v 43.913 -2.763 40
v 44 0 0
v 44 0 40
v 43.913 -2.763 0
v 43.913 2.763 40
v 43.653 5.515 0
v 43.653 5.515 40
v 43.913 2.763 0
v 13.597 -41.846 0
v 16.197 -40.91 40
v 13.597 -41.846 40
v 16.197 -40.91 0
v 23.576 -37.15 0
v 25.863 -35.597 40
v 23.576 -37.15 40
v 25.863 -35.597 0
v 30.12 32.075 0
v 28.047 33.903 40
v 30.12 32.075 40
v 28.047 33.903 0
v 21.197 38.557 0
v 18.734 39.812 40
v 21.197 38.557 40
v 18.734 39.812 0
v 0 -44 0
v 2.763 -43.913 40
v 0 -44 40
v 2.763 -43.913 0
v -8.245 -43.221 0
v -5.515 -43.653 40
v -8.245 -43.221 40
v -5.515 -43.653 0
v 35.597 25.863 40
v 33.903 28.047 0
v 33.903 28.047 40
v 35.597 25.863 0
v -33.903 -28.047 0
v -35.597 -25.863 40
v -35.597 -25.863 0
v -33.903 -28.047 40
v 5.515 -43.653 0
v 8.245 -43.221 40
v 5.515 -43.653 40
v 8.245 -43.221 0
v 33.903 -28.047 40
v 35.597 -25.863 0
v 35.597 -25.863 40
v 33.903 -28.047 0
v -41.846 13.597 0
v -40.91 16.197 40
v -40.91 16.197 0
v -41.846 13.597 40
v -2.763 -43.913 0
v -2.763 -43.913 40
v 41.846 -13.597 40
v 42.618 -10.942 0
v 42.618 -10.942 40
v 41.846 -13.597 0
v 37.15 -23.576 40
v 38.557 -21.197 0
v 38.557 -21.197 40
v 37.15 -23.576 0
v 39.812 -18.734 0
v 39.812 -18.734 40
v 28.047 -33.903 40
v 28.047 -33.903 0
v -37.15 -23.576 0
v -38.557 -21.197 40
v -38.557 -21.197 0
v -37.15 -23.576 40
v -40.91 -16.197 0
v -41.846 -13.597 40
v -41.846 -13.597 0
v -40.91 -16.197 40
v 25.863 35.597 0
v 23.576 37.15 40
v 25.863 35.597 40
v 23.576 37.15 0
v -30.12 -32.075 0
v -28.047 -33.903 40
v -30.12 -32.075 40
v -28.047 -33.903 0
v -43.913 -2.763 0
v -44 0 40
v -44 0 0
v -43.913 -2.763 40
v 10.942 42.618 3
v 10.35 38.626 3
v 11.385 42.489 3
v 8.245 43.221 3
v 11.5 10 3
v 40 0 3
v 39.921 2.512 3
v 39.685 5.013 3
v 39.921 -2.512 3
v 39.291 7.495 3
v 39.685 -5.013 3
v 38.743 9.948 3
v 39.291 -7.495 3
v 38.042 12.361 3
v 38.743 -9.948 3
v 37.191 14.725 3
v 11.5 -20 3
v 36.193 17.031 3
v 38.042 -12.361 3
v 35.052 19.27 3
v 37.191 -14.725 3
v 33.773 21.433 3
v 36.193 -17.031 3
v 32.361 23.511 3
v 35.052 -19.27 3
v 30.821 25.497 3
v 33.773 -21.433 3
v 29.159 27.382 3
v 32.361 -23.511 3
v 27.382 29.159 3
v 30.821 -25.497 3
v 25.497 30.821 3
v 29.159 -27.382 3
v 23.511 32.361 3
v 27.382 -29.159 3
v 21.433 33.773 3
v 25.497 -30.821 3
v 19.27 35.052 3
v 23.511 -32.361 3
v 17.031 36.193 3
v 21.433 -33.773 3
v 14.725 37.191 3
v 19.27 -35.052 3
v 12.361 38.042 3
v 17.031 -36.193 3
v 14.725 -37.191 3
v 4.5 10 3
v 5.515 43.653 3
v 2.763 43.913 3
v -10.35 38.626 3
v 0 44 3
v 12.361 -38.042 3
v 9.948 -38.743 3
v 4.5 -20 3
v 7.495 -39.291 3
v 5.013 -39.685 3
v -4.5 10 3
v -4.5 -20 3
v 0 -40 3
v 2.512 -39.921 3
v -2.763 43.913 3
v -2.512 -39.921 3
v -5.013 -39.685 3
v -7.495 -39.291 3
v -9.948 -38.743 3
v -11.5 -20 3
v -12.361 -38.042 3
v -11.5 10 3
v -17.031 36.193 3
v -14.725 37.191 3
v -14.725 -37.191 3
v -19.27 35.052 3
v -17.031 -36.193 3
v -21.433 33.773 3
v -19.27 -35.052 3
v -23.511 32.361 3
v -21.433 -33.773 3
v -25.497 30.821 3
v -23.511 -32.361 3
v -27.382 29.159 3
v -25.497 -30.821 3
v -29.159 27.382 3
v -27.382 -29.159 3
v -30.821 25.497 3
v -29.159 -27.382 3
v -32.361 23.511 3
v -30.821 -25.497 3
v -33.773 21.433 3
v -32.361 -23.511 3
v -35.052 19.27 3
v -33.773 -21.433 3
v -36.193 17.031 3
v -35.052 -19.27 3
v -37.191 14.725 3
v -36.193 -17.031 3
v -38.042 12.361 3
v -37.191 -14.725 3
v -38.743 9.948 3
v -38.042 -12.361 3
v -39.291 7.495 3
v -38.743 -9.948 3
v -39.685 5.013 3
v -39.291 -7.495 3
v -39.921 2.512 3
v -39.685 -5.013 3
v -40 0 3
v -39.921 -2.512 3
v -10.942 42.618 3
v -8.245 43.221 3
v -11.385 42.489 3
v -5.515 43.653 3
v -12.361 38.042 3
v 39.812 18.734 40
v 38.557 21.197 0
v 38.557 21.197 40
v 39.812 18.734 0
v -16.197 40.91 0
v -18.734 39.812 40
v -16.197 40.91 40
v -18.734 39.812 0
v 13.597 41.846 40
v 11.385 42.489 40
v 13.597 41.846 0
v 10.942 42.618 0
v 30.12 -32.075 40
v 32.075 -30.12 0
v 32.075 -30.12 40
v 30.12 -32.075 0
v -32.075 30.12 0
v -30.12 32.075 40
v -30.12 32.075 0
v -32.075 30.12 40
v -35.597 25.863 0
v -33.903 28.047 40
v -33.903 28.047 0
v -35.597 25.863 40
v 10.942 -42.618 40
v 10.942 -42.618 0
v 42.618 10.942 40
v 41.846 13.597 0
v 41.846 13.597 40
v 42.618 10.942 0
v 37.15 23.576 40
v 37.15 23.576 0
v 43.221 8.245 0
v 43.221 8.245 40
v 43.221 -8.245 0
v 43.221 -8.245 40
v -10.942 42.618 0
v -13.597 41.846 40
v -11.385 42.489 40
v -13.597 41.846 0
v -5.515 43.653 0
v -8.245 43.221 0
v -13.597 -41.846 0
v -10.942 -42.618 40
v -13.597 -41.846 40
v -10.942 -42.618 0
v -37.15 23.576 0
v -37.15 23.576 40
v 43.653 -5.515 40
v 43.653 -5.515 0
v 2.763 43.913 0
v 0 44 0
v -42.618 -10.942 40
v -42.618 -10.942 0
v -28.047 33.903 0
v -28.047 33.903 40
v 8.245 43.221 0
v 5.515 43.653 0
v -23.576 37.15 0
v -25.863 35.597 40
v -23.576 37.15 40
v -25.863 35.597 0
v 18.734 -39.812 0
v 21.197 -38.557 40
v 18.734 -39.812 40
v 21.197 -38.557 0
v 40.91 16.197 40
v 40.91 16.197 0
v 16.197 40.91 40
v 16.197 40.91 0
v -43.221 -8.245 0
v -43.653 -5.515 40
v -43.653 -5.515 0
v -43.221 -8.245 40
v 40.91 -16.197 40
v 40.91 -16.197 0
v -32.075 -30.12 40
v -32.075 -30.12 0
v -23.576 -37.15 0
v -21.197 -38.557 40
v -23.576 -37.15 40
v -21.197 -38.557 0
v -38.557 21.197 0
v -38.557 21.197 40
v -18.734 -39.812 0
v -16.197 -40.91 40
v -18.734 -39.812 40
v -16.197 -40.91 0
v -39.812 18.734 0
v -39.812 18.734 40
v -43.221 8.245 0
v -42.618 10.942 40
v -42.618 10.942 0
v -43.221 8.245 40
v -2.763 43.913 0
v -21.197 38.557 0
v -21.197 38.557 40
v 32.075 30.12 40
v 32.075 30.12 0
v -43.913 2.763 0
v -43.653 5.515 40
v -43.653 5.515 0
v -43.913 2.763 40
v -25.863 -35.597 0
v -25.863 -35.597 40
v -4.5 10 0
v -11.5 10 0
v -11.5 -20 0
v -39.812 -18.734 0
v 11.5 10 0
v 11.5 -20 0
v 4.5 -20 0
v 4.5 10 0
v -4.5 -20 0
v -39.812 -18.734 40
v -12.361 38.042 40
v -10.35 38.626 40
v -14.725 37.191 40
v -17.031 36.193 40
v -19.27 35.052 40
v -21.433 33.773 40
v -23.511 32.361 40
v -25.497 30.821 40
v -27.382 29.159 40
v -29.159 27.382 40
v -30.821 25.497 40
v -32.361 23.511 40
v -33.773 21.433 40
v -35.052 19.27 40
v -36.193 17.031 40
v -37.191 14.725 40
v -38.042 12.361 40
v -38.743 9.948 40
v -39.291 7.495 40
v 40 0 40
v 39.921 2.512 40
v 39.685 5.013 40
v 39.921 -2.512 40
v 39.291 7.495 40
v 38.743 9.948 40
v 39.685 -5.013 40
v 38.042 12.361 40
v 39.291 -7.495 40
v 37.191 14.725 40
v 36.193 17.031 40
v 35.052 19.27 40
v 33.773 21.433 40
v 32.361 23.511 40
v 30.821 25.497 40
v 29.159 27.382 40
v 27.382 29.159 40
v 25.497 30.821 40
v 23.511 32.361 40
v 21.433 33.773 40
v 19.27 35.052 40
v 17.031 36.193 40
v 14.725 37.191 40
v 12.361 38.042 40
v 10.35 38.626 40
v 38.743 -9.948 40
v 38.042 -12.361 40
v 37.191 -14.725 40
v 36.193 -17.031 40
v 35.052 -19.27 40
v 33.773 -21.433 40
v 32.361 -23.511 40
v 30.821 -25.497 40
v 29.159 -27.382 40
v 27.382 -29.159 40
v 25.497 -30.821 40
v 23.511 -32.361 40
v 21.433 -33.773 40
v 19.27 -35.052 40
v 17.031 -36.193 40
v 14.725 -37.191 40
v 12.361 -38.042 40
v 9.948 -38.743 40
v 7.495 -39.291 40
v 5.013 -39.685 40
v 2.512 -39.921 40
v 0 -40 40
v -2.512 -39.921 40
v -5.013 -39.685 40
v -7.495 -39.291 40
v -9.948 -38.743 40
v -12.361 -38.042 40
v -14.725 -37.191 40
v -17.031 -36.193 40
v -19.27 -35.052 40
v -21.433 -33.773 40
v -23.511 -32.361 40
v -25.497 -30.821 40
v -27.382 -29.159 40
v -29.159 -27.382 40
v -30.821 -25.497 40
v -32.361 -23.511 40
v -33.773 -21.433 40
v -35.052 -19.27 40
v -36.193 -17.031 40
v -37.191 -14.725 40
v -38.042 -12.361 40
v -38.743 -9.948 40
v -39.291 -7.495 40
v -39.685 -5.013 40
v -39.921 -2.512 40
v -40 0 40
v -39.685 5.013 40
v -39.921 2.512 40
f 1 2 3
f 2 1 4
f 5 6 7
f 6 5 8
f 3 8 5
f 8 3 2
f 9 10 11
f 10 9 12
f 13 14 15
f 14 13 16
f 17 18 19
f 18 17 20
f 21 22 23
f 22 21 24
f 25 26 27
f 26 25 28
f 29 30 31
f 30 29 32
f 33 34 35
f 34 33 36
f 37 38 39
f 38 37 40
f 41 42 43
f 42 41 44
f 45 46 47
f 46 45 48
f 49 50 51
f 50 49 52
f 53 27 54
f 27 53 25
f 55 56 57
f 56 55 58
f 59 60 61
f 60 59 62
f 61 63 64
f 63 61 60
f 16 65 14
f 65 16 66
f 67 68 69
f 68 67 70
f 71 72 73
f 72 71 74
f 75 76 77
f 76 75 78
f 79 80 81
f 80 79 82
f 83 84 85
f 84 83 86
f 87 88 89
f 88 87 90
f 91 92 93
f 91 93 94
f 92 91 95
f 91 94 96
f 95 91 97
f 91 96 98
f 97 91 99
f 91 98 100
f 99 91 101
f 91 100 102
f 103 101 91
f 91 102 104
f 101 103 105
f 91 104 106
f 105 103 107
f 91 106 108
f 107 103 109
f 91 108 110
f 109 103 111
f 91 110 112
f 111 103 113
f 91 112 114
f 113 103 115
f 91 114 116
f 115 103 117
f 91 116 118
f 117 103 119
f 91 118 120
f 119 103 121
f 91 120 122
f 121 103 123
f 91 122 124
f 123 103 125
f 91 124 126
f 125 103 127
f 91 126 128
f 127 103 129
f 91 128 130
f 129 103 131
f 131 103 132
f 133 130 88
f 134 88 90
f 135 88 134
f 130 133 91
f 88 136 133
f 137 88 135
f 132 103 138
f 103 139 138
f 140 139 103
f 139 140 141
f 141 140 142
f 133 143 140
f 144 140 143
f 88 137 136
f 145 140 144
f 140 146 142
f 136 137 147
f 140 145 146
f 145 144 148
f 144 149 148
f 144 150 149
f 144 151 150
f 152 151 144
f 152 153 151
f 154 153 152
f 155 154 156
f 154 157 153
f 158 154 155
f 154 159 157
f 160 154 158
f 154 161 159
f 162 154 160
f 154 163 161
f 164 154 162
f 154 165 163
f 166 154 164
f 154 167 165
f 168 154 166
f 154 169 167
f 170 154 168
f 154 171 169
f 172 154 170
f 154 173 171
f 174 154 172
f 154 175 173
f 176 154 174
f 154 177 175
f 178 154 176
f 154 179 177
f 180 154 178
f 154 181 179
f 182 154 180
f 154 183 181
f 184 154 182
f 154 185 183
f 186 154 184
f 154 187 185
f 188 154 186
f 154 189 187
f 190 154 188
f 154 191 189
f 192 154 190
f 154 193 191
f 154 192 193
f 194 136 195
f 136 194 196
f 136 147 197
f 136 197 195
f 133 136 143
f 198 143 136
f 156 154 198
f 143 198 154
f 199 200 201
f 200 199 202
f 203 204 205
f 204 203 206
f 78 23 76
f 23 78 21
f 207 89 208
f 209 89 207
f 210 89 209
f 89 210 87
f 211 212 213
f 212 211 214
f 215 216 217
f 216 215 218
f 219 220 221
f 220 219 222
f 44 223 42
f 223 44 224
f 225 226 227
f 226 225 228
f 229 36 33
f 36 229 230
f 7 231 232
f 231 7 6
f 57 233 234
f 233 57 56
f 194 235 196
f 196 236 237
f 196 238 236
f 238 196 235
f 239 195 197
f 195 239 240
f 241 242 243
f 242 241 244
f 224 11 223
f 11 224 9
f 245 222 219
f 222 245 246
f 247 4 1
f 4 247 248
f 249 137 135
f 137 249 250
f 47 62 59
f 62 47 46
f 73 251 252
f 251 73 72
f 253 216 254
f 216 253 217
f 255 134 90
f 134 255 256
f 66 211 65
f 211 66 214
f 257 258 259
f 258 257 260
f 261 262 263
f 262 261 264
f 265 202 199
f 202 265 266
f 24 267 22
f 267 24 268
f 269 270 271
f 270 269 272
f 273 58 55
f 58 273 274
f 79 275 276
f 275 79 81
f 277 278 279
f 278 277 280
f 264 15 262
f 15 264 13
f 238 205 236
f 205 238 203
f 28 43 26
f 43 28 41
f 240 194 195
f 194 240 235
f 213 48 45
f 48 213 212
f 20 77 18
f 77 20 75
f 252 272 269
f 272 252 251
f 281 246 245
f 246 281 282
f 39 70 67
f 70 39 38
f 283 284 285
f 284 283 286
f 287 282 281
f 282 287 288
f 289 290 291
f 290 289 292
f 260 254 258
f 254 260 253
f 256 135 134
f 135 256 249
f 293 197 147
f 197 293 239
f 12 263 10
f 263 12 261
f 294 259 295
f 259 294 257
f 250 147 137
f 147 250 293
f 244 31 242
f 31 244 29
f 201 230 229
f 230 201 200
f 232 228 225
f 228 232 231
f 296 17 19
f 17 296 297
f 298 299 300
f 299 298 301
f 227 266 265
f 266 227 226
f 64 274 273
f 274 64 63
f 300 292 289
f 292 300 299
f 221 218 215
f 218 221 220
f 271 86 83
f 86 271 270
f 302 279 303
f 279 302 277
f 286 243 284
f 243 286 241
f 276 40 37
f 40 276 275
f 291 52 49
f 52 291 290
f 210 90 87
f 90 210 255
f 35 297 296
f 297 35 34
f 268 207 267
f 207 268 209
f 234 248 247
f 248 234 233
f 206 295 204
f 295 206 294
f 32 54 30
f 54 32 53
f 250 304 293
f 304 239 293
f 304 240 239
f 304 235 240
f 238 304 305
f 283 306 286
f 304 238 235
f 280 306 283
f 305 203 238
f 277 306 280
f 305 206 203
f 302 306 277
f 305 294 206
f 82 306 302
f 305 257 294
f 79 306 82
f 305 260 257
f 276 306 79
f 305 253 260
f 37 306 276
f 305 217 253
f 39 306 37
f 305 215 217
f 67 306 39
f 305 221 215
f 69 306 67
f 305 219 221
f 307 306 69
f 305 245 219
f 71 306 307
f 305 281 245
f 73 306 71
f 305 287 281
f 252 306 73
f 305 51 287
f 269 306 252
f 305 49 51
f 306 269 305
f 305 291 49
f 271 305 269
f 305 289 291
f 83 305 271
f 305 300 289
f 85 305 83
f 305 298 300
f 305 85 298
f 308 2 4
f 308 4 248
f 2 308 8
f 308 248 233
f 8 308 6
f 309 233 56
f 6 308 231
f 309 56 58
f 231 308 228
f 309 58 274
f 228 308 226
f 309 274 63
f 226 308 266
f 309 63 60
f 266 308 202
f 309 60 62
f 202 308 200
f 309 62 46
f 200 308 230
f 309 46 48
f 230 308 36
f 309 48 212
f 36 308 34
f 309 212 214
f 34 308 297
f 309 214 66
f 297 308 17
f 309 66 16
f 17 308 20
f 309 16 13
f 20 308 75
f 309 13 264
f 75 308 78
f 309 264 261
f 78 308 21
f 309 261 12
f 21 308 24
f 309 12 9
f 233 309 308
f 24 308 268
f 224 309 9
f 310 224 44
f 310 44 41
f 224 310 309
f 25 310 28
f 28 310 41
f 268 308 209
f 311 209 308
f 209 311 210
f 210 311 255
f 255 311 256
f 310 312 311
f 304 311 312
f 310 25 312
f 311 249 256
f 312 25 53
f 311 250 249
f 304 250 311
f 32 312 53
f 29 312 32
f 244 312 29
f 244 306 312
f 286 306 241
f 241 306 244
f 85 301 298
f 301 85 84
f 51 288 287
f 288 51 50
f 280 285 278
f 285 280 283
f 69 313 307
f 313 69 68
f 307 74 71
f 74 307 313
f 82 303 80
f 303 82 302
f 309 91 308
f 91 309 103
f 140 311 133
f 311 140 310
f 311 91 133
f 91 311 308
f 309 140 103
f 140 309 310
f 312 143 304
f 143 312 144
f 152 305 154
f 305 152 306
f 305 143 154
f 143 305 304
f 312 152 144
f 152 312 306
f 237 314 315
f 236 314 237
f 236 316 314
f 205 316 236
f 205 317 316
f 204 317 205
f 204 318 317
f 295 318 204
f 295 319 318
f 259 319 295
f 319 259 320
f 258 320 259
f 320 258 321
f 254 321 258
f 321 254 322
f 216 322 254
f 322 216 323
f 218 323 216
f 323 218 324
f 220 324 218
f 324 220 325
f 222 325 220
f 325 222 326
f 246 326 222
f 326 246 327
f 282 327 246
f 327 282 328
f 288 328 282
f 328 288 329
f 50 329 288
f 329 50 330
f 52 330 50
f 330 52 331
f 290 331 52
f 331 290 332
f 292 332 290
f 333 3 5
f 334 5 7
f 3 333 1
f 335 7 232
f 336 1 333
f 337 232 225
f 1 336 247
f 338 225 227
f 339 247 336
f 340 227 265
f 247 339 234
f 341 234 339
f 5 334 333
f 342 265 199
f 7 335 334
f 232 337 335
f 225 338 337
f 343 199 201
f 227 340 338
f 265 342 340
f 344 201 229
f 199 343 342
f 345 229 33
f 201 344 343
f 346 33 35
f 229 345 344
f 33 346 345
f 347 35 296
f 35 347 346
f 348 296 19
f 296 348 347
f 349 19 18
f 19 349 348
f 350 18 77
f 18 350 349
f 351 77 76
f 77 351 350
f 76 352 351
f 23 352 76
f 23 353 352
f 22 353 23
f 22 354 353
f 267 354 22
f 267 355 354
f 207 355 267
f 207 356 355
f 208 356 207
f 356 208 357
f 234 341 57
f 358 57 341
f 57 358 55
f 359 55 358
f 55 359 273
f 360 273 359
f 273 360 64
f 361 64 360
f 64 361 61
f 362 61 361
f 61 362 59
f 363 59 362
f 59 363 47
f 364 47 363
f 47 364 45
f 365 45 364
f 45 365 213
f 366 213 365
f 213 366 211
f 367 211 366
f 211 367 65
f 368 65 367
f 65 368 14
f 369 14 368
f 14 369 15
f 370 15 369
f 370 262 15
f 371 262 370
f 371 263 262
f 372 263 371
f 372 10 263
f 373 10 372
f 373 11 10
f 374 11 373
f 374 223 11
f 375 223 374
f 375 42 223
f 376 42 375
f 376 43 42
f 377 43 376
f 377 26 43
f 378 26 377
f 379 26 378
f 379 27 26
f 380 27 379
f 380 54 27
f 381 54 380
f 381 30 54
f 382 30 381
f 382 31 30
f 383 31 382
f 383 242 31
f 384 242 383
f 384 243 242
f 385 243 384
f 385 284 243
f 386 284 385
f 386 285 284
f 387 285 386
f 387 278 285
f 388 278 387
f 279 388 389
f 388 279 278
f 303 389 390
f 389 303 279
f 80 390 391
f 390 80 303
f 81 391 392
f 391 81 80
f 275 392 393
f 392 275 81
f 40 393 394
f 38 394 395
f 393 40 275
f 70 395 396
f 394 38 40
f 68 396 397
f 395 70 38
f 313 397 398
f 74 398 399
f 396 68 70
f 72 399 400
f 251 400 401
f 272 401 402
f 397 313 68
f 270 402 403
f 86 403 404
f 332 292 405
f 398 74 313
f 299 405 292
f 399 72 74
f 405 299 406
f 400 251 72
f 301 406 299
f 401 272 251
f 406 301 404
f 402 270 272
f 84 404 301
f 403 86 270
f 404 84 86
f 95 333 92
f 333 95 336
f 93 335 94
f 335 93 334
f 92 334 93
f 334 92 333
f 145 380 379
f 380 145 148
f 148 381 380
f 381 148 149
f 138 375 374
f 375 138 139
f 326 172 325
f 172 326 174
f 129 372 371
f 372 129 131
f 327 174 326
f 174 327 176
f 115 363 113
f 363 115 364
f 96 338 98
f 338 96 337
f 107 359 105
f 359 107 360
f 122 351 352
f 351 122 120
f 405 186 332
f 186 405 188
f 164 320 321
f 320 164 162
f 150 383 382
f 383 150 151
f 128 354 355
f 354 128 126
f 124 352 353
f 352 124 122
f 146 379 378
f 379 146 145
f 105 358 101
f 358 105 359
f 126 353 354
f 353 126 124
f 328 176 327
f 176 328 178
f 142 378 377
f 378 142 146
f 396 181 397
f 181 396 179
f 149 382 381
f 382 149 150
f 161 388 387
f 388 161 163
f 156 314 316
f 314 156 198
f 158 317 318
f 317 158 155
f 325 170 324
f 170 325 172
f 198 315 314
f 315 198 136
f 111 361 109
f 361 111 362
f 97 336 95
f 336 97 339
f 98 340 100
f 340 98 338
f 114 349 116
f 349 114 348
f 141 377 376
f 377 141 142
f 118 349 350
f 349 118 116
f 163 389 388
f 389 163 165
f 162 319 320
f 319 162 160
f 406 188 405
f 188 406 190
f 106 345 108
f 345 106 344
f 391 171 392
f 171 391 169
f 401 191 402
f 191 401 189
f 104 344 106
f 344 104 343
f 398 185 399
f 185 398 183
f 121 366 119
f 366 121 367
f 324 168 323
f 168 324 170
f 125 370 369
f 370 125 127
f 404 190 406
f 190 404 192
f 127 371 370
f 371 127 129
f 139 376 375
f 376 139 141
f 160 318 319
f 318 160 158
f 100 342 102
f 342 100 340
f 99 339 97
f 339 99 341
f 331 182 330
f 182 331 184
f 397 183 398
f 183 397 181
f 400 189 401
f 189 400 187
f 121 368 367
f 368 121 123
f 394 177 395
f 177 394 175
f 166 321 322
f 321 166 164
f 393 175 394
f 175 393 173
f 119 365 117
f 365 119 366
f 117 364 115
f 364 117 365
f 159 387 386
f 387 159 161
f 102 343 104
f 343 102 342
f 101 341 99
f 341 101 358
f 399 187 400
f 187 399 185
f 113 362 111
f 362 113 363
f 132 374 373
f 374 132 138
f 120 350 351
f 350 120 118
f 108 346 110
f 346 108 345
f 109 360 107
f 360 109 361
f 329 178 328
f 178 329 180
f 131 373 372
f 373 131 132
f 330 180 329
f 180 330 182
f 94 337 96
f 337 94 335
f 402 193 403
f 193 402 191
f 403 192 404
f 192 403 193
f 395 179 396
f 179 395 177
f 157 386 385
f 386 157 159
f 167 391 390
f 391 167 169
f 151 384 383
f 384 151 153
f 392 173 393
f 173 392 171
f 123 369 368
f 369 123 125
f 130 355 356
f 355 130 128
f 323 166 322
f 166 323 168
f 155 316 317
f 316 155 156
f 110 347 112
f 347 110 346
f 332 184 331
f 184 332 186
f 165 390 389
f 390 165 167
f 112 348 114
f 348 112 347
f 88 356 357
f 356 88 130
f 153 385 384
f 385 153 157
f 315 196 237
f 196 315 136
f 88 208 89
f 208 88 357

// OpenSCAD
//
// Parameters
//
inner_radius      = 40;
outer_radius      = 44;

cylinder_height   = 40;
wall_thickness    = 3;
bottom_thickness  = 3;

missing_angle     = 30;   // Angular section to remove
start_angle       = 75;   // Starting angle of the opening

$fn = 100;                // High resolution for smooth circular surfaces


//
// Bottom plate with cutouts
//
difference() {

    // Solid bottom plate
    cylinder(
        h = bottom_thickness,
        r = inner_radius + wall_thickness + 1
    );

    // First rectangular cutout
    translate([8, -5, 0]) {
        cube([7, 30, 15], center = true);
    }

    // Second rectangular cutout
    translate([-8, -5, 0]) {
        cube([7, 30, 15], center = true);
    }
}


//
// Hollow cylinder with side opening
//
difference() {

    //
    // Main hollow cylinder
    //
    difference() {

        // Outer wall
        cylinder(
            h = cylinder_height,
            r = outer_radius
        );

        // Inner cavity
        translate([0, 0, -1]) {
            cylinder(
                h = cylinder_height + 2,
                r = inner_radius
            );
        }
    }

    //
    // Remove a pie-shaped section
    //
    translate([0, 0, -1]) {
        rotate([0, 0, start_angle]) {

            linear_extrude(height = cylinder_height + 2) {
                pie_slice_2d(
                    r = outer_radius + 5,
                    angle = missing_angle
                );
            }
        }
    }
}


//
// 2D pie-slice module
// Origin located at [0, 0]
//
module pie_slice_2d(r, angle) {

    intersection() {

        circle(r = r);

        polygon(
            points = concat(
                [[0, 0]],
                [
                    for (a = [0 : 5 : angle])
                        [r * 2 * cos(a), r * 2 * sin(a)]
                ],
                [[r * 2 * cos(angle), r * 2 * sin(angle)]]
            )
        );
    }
}
